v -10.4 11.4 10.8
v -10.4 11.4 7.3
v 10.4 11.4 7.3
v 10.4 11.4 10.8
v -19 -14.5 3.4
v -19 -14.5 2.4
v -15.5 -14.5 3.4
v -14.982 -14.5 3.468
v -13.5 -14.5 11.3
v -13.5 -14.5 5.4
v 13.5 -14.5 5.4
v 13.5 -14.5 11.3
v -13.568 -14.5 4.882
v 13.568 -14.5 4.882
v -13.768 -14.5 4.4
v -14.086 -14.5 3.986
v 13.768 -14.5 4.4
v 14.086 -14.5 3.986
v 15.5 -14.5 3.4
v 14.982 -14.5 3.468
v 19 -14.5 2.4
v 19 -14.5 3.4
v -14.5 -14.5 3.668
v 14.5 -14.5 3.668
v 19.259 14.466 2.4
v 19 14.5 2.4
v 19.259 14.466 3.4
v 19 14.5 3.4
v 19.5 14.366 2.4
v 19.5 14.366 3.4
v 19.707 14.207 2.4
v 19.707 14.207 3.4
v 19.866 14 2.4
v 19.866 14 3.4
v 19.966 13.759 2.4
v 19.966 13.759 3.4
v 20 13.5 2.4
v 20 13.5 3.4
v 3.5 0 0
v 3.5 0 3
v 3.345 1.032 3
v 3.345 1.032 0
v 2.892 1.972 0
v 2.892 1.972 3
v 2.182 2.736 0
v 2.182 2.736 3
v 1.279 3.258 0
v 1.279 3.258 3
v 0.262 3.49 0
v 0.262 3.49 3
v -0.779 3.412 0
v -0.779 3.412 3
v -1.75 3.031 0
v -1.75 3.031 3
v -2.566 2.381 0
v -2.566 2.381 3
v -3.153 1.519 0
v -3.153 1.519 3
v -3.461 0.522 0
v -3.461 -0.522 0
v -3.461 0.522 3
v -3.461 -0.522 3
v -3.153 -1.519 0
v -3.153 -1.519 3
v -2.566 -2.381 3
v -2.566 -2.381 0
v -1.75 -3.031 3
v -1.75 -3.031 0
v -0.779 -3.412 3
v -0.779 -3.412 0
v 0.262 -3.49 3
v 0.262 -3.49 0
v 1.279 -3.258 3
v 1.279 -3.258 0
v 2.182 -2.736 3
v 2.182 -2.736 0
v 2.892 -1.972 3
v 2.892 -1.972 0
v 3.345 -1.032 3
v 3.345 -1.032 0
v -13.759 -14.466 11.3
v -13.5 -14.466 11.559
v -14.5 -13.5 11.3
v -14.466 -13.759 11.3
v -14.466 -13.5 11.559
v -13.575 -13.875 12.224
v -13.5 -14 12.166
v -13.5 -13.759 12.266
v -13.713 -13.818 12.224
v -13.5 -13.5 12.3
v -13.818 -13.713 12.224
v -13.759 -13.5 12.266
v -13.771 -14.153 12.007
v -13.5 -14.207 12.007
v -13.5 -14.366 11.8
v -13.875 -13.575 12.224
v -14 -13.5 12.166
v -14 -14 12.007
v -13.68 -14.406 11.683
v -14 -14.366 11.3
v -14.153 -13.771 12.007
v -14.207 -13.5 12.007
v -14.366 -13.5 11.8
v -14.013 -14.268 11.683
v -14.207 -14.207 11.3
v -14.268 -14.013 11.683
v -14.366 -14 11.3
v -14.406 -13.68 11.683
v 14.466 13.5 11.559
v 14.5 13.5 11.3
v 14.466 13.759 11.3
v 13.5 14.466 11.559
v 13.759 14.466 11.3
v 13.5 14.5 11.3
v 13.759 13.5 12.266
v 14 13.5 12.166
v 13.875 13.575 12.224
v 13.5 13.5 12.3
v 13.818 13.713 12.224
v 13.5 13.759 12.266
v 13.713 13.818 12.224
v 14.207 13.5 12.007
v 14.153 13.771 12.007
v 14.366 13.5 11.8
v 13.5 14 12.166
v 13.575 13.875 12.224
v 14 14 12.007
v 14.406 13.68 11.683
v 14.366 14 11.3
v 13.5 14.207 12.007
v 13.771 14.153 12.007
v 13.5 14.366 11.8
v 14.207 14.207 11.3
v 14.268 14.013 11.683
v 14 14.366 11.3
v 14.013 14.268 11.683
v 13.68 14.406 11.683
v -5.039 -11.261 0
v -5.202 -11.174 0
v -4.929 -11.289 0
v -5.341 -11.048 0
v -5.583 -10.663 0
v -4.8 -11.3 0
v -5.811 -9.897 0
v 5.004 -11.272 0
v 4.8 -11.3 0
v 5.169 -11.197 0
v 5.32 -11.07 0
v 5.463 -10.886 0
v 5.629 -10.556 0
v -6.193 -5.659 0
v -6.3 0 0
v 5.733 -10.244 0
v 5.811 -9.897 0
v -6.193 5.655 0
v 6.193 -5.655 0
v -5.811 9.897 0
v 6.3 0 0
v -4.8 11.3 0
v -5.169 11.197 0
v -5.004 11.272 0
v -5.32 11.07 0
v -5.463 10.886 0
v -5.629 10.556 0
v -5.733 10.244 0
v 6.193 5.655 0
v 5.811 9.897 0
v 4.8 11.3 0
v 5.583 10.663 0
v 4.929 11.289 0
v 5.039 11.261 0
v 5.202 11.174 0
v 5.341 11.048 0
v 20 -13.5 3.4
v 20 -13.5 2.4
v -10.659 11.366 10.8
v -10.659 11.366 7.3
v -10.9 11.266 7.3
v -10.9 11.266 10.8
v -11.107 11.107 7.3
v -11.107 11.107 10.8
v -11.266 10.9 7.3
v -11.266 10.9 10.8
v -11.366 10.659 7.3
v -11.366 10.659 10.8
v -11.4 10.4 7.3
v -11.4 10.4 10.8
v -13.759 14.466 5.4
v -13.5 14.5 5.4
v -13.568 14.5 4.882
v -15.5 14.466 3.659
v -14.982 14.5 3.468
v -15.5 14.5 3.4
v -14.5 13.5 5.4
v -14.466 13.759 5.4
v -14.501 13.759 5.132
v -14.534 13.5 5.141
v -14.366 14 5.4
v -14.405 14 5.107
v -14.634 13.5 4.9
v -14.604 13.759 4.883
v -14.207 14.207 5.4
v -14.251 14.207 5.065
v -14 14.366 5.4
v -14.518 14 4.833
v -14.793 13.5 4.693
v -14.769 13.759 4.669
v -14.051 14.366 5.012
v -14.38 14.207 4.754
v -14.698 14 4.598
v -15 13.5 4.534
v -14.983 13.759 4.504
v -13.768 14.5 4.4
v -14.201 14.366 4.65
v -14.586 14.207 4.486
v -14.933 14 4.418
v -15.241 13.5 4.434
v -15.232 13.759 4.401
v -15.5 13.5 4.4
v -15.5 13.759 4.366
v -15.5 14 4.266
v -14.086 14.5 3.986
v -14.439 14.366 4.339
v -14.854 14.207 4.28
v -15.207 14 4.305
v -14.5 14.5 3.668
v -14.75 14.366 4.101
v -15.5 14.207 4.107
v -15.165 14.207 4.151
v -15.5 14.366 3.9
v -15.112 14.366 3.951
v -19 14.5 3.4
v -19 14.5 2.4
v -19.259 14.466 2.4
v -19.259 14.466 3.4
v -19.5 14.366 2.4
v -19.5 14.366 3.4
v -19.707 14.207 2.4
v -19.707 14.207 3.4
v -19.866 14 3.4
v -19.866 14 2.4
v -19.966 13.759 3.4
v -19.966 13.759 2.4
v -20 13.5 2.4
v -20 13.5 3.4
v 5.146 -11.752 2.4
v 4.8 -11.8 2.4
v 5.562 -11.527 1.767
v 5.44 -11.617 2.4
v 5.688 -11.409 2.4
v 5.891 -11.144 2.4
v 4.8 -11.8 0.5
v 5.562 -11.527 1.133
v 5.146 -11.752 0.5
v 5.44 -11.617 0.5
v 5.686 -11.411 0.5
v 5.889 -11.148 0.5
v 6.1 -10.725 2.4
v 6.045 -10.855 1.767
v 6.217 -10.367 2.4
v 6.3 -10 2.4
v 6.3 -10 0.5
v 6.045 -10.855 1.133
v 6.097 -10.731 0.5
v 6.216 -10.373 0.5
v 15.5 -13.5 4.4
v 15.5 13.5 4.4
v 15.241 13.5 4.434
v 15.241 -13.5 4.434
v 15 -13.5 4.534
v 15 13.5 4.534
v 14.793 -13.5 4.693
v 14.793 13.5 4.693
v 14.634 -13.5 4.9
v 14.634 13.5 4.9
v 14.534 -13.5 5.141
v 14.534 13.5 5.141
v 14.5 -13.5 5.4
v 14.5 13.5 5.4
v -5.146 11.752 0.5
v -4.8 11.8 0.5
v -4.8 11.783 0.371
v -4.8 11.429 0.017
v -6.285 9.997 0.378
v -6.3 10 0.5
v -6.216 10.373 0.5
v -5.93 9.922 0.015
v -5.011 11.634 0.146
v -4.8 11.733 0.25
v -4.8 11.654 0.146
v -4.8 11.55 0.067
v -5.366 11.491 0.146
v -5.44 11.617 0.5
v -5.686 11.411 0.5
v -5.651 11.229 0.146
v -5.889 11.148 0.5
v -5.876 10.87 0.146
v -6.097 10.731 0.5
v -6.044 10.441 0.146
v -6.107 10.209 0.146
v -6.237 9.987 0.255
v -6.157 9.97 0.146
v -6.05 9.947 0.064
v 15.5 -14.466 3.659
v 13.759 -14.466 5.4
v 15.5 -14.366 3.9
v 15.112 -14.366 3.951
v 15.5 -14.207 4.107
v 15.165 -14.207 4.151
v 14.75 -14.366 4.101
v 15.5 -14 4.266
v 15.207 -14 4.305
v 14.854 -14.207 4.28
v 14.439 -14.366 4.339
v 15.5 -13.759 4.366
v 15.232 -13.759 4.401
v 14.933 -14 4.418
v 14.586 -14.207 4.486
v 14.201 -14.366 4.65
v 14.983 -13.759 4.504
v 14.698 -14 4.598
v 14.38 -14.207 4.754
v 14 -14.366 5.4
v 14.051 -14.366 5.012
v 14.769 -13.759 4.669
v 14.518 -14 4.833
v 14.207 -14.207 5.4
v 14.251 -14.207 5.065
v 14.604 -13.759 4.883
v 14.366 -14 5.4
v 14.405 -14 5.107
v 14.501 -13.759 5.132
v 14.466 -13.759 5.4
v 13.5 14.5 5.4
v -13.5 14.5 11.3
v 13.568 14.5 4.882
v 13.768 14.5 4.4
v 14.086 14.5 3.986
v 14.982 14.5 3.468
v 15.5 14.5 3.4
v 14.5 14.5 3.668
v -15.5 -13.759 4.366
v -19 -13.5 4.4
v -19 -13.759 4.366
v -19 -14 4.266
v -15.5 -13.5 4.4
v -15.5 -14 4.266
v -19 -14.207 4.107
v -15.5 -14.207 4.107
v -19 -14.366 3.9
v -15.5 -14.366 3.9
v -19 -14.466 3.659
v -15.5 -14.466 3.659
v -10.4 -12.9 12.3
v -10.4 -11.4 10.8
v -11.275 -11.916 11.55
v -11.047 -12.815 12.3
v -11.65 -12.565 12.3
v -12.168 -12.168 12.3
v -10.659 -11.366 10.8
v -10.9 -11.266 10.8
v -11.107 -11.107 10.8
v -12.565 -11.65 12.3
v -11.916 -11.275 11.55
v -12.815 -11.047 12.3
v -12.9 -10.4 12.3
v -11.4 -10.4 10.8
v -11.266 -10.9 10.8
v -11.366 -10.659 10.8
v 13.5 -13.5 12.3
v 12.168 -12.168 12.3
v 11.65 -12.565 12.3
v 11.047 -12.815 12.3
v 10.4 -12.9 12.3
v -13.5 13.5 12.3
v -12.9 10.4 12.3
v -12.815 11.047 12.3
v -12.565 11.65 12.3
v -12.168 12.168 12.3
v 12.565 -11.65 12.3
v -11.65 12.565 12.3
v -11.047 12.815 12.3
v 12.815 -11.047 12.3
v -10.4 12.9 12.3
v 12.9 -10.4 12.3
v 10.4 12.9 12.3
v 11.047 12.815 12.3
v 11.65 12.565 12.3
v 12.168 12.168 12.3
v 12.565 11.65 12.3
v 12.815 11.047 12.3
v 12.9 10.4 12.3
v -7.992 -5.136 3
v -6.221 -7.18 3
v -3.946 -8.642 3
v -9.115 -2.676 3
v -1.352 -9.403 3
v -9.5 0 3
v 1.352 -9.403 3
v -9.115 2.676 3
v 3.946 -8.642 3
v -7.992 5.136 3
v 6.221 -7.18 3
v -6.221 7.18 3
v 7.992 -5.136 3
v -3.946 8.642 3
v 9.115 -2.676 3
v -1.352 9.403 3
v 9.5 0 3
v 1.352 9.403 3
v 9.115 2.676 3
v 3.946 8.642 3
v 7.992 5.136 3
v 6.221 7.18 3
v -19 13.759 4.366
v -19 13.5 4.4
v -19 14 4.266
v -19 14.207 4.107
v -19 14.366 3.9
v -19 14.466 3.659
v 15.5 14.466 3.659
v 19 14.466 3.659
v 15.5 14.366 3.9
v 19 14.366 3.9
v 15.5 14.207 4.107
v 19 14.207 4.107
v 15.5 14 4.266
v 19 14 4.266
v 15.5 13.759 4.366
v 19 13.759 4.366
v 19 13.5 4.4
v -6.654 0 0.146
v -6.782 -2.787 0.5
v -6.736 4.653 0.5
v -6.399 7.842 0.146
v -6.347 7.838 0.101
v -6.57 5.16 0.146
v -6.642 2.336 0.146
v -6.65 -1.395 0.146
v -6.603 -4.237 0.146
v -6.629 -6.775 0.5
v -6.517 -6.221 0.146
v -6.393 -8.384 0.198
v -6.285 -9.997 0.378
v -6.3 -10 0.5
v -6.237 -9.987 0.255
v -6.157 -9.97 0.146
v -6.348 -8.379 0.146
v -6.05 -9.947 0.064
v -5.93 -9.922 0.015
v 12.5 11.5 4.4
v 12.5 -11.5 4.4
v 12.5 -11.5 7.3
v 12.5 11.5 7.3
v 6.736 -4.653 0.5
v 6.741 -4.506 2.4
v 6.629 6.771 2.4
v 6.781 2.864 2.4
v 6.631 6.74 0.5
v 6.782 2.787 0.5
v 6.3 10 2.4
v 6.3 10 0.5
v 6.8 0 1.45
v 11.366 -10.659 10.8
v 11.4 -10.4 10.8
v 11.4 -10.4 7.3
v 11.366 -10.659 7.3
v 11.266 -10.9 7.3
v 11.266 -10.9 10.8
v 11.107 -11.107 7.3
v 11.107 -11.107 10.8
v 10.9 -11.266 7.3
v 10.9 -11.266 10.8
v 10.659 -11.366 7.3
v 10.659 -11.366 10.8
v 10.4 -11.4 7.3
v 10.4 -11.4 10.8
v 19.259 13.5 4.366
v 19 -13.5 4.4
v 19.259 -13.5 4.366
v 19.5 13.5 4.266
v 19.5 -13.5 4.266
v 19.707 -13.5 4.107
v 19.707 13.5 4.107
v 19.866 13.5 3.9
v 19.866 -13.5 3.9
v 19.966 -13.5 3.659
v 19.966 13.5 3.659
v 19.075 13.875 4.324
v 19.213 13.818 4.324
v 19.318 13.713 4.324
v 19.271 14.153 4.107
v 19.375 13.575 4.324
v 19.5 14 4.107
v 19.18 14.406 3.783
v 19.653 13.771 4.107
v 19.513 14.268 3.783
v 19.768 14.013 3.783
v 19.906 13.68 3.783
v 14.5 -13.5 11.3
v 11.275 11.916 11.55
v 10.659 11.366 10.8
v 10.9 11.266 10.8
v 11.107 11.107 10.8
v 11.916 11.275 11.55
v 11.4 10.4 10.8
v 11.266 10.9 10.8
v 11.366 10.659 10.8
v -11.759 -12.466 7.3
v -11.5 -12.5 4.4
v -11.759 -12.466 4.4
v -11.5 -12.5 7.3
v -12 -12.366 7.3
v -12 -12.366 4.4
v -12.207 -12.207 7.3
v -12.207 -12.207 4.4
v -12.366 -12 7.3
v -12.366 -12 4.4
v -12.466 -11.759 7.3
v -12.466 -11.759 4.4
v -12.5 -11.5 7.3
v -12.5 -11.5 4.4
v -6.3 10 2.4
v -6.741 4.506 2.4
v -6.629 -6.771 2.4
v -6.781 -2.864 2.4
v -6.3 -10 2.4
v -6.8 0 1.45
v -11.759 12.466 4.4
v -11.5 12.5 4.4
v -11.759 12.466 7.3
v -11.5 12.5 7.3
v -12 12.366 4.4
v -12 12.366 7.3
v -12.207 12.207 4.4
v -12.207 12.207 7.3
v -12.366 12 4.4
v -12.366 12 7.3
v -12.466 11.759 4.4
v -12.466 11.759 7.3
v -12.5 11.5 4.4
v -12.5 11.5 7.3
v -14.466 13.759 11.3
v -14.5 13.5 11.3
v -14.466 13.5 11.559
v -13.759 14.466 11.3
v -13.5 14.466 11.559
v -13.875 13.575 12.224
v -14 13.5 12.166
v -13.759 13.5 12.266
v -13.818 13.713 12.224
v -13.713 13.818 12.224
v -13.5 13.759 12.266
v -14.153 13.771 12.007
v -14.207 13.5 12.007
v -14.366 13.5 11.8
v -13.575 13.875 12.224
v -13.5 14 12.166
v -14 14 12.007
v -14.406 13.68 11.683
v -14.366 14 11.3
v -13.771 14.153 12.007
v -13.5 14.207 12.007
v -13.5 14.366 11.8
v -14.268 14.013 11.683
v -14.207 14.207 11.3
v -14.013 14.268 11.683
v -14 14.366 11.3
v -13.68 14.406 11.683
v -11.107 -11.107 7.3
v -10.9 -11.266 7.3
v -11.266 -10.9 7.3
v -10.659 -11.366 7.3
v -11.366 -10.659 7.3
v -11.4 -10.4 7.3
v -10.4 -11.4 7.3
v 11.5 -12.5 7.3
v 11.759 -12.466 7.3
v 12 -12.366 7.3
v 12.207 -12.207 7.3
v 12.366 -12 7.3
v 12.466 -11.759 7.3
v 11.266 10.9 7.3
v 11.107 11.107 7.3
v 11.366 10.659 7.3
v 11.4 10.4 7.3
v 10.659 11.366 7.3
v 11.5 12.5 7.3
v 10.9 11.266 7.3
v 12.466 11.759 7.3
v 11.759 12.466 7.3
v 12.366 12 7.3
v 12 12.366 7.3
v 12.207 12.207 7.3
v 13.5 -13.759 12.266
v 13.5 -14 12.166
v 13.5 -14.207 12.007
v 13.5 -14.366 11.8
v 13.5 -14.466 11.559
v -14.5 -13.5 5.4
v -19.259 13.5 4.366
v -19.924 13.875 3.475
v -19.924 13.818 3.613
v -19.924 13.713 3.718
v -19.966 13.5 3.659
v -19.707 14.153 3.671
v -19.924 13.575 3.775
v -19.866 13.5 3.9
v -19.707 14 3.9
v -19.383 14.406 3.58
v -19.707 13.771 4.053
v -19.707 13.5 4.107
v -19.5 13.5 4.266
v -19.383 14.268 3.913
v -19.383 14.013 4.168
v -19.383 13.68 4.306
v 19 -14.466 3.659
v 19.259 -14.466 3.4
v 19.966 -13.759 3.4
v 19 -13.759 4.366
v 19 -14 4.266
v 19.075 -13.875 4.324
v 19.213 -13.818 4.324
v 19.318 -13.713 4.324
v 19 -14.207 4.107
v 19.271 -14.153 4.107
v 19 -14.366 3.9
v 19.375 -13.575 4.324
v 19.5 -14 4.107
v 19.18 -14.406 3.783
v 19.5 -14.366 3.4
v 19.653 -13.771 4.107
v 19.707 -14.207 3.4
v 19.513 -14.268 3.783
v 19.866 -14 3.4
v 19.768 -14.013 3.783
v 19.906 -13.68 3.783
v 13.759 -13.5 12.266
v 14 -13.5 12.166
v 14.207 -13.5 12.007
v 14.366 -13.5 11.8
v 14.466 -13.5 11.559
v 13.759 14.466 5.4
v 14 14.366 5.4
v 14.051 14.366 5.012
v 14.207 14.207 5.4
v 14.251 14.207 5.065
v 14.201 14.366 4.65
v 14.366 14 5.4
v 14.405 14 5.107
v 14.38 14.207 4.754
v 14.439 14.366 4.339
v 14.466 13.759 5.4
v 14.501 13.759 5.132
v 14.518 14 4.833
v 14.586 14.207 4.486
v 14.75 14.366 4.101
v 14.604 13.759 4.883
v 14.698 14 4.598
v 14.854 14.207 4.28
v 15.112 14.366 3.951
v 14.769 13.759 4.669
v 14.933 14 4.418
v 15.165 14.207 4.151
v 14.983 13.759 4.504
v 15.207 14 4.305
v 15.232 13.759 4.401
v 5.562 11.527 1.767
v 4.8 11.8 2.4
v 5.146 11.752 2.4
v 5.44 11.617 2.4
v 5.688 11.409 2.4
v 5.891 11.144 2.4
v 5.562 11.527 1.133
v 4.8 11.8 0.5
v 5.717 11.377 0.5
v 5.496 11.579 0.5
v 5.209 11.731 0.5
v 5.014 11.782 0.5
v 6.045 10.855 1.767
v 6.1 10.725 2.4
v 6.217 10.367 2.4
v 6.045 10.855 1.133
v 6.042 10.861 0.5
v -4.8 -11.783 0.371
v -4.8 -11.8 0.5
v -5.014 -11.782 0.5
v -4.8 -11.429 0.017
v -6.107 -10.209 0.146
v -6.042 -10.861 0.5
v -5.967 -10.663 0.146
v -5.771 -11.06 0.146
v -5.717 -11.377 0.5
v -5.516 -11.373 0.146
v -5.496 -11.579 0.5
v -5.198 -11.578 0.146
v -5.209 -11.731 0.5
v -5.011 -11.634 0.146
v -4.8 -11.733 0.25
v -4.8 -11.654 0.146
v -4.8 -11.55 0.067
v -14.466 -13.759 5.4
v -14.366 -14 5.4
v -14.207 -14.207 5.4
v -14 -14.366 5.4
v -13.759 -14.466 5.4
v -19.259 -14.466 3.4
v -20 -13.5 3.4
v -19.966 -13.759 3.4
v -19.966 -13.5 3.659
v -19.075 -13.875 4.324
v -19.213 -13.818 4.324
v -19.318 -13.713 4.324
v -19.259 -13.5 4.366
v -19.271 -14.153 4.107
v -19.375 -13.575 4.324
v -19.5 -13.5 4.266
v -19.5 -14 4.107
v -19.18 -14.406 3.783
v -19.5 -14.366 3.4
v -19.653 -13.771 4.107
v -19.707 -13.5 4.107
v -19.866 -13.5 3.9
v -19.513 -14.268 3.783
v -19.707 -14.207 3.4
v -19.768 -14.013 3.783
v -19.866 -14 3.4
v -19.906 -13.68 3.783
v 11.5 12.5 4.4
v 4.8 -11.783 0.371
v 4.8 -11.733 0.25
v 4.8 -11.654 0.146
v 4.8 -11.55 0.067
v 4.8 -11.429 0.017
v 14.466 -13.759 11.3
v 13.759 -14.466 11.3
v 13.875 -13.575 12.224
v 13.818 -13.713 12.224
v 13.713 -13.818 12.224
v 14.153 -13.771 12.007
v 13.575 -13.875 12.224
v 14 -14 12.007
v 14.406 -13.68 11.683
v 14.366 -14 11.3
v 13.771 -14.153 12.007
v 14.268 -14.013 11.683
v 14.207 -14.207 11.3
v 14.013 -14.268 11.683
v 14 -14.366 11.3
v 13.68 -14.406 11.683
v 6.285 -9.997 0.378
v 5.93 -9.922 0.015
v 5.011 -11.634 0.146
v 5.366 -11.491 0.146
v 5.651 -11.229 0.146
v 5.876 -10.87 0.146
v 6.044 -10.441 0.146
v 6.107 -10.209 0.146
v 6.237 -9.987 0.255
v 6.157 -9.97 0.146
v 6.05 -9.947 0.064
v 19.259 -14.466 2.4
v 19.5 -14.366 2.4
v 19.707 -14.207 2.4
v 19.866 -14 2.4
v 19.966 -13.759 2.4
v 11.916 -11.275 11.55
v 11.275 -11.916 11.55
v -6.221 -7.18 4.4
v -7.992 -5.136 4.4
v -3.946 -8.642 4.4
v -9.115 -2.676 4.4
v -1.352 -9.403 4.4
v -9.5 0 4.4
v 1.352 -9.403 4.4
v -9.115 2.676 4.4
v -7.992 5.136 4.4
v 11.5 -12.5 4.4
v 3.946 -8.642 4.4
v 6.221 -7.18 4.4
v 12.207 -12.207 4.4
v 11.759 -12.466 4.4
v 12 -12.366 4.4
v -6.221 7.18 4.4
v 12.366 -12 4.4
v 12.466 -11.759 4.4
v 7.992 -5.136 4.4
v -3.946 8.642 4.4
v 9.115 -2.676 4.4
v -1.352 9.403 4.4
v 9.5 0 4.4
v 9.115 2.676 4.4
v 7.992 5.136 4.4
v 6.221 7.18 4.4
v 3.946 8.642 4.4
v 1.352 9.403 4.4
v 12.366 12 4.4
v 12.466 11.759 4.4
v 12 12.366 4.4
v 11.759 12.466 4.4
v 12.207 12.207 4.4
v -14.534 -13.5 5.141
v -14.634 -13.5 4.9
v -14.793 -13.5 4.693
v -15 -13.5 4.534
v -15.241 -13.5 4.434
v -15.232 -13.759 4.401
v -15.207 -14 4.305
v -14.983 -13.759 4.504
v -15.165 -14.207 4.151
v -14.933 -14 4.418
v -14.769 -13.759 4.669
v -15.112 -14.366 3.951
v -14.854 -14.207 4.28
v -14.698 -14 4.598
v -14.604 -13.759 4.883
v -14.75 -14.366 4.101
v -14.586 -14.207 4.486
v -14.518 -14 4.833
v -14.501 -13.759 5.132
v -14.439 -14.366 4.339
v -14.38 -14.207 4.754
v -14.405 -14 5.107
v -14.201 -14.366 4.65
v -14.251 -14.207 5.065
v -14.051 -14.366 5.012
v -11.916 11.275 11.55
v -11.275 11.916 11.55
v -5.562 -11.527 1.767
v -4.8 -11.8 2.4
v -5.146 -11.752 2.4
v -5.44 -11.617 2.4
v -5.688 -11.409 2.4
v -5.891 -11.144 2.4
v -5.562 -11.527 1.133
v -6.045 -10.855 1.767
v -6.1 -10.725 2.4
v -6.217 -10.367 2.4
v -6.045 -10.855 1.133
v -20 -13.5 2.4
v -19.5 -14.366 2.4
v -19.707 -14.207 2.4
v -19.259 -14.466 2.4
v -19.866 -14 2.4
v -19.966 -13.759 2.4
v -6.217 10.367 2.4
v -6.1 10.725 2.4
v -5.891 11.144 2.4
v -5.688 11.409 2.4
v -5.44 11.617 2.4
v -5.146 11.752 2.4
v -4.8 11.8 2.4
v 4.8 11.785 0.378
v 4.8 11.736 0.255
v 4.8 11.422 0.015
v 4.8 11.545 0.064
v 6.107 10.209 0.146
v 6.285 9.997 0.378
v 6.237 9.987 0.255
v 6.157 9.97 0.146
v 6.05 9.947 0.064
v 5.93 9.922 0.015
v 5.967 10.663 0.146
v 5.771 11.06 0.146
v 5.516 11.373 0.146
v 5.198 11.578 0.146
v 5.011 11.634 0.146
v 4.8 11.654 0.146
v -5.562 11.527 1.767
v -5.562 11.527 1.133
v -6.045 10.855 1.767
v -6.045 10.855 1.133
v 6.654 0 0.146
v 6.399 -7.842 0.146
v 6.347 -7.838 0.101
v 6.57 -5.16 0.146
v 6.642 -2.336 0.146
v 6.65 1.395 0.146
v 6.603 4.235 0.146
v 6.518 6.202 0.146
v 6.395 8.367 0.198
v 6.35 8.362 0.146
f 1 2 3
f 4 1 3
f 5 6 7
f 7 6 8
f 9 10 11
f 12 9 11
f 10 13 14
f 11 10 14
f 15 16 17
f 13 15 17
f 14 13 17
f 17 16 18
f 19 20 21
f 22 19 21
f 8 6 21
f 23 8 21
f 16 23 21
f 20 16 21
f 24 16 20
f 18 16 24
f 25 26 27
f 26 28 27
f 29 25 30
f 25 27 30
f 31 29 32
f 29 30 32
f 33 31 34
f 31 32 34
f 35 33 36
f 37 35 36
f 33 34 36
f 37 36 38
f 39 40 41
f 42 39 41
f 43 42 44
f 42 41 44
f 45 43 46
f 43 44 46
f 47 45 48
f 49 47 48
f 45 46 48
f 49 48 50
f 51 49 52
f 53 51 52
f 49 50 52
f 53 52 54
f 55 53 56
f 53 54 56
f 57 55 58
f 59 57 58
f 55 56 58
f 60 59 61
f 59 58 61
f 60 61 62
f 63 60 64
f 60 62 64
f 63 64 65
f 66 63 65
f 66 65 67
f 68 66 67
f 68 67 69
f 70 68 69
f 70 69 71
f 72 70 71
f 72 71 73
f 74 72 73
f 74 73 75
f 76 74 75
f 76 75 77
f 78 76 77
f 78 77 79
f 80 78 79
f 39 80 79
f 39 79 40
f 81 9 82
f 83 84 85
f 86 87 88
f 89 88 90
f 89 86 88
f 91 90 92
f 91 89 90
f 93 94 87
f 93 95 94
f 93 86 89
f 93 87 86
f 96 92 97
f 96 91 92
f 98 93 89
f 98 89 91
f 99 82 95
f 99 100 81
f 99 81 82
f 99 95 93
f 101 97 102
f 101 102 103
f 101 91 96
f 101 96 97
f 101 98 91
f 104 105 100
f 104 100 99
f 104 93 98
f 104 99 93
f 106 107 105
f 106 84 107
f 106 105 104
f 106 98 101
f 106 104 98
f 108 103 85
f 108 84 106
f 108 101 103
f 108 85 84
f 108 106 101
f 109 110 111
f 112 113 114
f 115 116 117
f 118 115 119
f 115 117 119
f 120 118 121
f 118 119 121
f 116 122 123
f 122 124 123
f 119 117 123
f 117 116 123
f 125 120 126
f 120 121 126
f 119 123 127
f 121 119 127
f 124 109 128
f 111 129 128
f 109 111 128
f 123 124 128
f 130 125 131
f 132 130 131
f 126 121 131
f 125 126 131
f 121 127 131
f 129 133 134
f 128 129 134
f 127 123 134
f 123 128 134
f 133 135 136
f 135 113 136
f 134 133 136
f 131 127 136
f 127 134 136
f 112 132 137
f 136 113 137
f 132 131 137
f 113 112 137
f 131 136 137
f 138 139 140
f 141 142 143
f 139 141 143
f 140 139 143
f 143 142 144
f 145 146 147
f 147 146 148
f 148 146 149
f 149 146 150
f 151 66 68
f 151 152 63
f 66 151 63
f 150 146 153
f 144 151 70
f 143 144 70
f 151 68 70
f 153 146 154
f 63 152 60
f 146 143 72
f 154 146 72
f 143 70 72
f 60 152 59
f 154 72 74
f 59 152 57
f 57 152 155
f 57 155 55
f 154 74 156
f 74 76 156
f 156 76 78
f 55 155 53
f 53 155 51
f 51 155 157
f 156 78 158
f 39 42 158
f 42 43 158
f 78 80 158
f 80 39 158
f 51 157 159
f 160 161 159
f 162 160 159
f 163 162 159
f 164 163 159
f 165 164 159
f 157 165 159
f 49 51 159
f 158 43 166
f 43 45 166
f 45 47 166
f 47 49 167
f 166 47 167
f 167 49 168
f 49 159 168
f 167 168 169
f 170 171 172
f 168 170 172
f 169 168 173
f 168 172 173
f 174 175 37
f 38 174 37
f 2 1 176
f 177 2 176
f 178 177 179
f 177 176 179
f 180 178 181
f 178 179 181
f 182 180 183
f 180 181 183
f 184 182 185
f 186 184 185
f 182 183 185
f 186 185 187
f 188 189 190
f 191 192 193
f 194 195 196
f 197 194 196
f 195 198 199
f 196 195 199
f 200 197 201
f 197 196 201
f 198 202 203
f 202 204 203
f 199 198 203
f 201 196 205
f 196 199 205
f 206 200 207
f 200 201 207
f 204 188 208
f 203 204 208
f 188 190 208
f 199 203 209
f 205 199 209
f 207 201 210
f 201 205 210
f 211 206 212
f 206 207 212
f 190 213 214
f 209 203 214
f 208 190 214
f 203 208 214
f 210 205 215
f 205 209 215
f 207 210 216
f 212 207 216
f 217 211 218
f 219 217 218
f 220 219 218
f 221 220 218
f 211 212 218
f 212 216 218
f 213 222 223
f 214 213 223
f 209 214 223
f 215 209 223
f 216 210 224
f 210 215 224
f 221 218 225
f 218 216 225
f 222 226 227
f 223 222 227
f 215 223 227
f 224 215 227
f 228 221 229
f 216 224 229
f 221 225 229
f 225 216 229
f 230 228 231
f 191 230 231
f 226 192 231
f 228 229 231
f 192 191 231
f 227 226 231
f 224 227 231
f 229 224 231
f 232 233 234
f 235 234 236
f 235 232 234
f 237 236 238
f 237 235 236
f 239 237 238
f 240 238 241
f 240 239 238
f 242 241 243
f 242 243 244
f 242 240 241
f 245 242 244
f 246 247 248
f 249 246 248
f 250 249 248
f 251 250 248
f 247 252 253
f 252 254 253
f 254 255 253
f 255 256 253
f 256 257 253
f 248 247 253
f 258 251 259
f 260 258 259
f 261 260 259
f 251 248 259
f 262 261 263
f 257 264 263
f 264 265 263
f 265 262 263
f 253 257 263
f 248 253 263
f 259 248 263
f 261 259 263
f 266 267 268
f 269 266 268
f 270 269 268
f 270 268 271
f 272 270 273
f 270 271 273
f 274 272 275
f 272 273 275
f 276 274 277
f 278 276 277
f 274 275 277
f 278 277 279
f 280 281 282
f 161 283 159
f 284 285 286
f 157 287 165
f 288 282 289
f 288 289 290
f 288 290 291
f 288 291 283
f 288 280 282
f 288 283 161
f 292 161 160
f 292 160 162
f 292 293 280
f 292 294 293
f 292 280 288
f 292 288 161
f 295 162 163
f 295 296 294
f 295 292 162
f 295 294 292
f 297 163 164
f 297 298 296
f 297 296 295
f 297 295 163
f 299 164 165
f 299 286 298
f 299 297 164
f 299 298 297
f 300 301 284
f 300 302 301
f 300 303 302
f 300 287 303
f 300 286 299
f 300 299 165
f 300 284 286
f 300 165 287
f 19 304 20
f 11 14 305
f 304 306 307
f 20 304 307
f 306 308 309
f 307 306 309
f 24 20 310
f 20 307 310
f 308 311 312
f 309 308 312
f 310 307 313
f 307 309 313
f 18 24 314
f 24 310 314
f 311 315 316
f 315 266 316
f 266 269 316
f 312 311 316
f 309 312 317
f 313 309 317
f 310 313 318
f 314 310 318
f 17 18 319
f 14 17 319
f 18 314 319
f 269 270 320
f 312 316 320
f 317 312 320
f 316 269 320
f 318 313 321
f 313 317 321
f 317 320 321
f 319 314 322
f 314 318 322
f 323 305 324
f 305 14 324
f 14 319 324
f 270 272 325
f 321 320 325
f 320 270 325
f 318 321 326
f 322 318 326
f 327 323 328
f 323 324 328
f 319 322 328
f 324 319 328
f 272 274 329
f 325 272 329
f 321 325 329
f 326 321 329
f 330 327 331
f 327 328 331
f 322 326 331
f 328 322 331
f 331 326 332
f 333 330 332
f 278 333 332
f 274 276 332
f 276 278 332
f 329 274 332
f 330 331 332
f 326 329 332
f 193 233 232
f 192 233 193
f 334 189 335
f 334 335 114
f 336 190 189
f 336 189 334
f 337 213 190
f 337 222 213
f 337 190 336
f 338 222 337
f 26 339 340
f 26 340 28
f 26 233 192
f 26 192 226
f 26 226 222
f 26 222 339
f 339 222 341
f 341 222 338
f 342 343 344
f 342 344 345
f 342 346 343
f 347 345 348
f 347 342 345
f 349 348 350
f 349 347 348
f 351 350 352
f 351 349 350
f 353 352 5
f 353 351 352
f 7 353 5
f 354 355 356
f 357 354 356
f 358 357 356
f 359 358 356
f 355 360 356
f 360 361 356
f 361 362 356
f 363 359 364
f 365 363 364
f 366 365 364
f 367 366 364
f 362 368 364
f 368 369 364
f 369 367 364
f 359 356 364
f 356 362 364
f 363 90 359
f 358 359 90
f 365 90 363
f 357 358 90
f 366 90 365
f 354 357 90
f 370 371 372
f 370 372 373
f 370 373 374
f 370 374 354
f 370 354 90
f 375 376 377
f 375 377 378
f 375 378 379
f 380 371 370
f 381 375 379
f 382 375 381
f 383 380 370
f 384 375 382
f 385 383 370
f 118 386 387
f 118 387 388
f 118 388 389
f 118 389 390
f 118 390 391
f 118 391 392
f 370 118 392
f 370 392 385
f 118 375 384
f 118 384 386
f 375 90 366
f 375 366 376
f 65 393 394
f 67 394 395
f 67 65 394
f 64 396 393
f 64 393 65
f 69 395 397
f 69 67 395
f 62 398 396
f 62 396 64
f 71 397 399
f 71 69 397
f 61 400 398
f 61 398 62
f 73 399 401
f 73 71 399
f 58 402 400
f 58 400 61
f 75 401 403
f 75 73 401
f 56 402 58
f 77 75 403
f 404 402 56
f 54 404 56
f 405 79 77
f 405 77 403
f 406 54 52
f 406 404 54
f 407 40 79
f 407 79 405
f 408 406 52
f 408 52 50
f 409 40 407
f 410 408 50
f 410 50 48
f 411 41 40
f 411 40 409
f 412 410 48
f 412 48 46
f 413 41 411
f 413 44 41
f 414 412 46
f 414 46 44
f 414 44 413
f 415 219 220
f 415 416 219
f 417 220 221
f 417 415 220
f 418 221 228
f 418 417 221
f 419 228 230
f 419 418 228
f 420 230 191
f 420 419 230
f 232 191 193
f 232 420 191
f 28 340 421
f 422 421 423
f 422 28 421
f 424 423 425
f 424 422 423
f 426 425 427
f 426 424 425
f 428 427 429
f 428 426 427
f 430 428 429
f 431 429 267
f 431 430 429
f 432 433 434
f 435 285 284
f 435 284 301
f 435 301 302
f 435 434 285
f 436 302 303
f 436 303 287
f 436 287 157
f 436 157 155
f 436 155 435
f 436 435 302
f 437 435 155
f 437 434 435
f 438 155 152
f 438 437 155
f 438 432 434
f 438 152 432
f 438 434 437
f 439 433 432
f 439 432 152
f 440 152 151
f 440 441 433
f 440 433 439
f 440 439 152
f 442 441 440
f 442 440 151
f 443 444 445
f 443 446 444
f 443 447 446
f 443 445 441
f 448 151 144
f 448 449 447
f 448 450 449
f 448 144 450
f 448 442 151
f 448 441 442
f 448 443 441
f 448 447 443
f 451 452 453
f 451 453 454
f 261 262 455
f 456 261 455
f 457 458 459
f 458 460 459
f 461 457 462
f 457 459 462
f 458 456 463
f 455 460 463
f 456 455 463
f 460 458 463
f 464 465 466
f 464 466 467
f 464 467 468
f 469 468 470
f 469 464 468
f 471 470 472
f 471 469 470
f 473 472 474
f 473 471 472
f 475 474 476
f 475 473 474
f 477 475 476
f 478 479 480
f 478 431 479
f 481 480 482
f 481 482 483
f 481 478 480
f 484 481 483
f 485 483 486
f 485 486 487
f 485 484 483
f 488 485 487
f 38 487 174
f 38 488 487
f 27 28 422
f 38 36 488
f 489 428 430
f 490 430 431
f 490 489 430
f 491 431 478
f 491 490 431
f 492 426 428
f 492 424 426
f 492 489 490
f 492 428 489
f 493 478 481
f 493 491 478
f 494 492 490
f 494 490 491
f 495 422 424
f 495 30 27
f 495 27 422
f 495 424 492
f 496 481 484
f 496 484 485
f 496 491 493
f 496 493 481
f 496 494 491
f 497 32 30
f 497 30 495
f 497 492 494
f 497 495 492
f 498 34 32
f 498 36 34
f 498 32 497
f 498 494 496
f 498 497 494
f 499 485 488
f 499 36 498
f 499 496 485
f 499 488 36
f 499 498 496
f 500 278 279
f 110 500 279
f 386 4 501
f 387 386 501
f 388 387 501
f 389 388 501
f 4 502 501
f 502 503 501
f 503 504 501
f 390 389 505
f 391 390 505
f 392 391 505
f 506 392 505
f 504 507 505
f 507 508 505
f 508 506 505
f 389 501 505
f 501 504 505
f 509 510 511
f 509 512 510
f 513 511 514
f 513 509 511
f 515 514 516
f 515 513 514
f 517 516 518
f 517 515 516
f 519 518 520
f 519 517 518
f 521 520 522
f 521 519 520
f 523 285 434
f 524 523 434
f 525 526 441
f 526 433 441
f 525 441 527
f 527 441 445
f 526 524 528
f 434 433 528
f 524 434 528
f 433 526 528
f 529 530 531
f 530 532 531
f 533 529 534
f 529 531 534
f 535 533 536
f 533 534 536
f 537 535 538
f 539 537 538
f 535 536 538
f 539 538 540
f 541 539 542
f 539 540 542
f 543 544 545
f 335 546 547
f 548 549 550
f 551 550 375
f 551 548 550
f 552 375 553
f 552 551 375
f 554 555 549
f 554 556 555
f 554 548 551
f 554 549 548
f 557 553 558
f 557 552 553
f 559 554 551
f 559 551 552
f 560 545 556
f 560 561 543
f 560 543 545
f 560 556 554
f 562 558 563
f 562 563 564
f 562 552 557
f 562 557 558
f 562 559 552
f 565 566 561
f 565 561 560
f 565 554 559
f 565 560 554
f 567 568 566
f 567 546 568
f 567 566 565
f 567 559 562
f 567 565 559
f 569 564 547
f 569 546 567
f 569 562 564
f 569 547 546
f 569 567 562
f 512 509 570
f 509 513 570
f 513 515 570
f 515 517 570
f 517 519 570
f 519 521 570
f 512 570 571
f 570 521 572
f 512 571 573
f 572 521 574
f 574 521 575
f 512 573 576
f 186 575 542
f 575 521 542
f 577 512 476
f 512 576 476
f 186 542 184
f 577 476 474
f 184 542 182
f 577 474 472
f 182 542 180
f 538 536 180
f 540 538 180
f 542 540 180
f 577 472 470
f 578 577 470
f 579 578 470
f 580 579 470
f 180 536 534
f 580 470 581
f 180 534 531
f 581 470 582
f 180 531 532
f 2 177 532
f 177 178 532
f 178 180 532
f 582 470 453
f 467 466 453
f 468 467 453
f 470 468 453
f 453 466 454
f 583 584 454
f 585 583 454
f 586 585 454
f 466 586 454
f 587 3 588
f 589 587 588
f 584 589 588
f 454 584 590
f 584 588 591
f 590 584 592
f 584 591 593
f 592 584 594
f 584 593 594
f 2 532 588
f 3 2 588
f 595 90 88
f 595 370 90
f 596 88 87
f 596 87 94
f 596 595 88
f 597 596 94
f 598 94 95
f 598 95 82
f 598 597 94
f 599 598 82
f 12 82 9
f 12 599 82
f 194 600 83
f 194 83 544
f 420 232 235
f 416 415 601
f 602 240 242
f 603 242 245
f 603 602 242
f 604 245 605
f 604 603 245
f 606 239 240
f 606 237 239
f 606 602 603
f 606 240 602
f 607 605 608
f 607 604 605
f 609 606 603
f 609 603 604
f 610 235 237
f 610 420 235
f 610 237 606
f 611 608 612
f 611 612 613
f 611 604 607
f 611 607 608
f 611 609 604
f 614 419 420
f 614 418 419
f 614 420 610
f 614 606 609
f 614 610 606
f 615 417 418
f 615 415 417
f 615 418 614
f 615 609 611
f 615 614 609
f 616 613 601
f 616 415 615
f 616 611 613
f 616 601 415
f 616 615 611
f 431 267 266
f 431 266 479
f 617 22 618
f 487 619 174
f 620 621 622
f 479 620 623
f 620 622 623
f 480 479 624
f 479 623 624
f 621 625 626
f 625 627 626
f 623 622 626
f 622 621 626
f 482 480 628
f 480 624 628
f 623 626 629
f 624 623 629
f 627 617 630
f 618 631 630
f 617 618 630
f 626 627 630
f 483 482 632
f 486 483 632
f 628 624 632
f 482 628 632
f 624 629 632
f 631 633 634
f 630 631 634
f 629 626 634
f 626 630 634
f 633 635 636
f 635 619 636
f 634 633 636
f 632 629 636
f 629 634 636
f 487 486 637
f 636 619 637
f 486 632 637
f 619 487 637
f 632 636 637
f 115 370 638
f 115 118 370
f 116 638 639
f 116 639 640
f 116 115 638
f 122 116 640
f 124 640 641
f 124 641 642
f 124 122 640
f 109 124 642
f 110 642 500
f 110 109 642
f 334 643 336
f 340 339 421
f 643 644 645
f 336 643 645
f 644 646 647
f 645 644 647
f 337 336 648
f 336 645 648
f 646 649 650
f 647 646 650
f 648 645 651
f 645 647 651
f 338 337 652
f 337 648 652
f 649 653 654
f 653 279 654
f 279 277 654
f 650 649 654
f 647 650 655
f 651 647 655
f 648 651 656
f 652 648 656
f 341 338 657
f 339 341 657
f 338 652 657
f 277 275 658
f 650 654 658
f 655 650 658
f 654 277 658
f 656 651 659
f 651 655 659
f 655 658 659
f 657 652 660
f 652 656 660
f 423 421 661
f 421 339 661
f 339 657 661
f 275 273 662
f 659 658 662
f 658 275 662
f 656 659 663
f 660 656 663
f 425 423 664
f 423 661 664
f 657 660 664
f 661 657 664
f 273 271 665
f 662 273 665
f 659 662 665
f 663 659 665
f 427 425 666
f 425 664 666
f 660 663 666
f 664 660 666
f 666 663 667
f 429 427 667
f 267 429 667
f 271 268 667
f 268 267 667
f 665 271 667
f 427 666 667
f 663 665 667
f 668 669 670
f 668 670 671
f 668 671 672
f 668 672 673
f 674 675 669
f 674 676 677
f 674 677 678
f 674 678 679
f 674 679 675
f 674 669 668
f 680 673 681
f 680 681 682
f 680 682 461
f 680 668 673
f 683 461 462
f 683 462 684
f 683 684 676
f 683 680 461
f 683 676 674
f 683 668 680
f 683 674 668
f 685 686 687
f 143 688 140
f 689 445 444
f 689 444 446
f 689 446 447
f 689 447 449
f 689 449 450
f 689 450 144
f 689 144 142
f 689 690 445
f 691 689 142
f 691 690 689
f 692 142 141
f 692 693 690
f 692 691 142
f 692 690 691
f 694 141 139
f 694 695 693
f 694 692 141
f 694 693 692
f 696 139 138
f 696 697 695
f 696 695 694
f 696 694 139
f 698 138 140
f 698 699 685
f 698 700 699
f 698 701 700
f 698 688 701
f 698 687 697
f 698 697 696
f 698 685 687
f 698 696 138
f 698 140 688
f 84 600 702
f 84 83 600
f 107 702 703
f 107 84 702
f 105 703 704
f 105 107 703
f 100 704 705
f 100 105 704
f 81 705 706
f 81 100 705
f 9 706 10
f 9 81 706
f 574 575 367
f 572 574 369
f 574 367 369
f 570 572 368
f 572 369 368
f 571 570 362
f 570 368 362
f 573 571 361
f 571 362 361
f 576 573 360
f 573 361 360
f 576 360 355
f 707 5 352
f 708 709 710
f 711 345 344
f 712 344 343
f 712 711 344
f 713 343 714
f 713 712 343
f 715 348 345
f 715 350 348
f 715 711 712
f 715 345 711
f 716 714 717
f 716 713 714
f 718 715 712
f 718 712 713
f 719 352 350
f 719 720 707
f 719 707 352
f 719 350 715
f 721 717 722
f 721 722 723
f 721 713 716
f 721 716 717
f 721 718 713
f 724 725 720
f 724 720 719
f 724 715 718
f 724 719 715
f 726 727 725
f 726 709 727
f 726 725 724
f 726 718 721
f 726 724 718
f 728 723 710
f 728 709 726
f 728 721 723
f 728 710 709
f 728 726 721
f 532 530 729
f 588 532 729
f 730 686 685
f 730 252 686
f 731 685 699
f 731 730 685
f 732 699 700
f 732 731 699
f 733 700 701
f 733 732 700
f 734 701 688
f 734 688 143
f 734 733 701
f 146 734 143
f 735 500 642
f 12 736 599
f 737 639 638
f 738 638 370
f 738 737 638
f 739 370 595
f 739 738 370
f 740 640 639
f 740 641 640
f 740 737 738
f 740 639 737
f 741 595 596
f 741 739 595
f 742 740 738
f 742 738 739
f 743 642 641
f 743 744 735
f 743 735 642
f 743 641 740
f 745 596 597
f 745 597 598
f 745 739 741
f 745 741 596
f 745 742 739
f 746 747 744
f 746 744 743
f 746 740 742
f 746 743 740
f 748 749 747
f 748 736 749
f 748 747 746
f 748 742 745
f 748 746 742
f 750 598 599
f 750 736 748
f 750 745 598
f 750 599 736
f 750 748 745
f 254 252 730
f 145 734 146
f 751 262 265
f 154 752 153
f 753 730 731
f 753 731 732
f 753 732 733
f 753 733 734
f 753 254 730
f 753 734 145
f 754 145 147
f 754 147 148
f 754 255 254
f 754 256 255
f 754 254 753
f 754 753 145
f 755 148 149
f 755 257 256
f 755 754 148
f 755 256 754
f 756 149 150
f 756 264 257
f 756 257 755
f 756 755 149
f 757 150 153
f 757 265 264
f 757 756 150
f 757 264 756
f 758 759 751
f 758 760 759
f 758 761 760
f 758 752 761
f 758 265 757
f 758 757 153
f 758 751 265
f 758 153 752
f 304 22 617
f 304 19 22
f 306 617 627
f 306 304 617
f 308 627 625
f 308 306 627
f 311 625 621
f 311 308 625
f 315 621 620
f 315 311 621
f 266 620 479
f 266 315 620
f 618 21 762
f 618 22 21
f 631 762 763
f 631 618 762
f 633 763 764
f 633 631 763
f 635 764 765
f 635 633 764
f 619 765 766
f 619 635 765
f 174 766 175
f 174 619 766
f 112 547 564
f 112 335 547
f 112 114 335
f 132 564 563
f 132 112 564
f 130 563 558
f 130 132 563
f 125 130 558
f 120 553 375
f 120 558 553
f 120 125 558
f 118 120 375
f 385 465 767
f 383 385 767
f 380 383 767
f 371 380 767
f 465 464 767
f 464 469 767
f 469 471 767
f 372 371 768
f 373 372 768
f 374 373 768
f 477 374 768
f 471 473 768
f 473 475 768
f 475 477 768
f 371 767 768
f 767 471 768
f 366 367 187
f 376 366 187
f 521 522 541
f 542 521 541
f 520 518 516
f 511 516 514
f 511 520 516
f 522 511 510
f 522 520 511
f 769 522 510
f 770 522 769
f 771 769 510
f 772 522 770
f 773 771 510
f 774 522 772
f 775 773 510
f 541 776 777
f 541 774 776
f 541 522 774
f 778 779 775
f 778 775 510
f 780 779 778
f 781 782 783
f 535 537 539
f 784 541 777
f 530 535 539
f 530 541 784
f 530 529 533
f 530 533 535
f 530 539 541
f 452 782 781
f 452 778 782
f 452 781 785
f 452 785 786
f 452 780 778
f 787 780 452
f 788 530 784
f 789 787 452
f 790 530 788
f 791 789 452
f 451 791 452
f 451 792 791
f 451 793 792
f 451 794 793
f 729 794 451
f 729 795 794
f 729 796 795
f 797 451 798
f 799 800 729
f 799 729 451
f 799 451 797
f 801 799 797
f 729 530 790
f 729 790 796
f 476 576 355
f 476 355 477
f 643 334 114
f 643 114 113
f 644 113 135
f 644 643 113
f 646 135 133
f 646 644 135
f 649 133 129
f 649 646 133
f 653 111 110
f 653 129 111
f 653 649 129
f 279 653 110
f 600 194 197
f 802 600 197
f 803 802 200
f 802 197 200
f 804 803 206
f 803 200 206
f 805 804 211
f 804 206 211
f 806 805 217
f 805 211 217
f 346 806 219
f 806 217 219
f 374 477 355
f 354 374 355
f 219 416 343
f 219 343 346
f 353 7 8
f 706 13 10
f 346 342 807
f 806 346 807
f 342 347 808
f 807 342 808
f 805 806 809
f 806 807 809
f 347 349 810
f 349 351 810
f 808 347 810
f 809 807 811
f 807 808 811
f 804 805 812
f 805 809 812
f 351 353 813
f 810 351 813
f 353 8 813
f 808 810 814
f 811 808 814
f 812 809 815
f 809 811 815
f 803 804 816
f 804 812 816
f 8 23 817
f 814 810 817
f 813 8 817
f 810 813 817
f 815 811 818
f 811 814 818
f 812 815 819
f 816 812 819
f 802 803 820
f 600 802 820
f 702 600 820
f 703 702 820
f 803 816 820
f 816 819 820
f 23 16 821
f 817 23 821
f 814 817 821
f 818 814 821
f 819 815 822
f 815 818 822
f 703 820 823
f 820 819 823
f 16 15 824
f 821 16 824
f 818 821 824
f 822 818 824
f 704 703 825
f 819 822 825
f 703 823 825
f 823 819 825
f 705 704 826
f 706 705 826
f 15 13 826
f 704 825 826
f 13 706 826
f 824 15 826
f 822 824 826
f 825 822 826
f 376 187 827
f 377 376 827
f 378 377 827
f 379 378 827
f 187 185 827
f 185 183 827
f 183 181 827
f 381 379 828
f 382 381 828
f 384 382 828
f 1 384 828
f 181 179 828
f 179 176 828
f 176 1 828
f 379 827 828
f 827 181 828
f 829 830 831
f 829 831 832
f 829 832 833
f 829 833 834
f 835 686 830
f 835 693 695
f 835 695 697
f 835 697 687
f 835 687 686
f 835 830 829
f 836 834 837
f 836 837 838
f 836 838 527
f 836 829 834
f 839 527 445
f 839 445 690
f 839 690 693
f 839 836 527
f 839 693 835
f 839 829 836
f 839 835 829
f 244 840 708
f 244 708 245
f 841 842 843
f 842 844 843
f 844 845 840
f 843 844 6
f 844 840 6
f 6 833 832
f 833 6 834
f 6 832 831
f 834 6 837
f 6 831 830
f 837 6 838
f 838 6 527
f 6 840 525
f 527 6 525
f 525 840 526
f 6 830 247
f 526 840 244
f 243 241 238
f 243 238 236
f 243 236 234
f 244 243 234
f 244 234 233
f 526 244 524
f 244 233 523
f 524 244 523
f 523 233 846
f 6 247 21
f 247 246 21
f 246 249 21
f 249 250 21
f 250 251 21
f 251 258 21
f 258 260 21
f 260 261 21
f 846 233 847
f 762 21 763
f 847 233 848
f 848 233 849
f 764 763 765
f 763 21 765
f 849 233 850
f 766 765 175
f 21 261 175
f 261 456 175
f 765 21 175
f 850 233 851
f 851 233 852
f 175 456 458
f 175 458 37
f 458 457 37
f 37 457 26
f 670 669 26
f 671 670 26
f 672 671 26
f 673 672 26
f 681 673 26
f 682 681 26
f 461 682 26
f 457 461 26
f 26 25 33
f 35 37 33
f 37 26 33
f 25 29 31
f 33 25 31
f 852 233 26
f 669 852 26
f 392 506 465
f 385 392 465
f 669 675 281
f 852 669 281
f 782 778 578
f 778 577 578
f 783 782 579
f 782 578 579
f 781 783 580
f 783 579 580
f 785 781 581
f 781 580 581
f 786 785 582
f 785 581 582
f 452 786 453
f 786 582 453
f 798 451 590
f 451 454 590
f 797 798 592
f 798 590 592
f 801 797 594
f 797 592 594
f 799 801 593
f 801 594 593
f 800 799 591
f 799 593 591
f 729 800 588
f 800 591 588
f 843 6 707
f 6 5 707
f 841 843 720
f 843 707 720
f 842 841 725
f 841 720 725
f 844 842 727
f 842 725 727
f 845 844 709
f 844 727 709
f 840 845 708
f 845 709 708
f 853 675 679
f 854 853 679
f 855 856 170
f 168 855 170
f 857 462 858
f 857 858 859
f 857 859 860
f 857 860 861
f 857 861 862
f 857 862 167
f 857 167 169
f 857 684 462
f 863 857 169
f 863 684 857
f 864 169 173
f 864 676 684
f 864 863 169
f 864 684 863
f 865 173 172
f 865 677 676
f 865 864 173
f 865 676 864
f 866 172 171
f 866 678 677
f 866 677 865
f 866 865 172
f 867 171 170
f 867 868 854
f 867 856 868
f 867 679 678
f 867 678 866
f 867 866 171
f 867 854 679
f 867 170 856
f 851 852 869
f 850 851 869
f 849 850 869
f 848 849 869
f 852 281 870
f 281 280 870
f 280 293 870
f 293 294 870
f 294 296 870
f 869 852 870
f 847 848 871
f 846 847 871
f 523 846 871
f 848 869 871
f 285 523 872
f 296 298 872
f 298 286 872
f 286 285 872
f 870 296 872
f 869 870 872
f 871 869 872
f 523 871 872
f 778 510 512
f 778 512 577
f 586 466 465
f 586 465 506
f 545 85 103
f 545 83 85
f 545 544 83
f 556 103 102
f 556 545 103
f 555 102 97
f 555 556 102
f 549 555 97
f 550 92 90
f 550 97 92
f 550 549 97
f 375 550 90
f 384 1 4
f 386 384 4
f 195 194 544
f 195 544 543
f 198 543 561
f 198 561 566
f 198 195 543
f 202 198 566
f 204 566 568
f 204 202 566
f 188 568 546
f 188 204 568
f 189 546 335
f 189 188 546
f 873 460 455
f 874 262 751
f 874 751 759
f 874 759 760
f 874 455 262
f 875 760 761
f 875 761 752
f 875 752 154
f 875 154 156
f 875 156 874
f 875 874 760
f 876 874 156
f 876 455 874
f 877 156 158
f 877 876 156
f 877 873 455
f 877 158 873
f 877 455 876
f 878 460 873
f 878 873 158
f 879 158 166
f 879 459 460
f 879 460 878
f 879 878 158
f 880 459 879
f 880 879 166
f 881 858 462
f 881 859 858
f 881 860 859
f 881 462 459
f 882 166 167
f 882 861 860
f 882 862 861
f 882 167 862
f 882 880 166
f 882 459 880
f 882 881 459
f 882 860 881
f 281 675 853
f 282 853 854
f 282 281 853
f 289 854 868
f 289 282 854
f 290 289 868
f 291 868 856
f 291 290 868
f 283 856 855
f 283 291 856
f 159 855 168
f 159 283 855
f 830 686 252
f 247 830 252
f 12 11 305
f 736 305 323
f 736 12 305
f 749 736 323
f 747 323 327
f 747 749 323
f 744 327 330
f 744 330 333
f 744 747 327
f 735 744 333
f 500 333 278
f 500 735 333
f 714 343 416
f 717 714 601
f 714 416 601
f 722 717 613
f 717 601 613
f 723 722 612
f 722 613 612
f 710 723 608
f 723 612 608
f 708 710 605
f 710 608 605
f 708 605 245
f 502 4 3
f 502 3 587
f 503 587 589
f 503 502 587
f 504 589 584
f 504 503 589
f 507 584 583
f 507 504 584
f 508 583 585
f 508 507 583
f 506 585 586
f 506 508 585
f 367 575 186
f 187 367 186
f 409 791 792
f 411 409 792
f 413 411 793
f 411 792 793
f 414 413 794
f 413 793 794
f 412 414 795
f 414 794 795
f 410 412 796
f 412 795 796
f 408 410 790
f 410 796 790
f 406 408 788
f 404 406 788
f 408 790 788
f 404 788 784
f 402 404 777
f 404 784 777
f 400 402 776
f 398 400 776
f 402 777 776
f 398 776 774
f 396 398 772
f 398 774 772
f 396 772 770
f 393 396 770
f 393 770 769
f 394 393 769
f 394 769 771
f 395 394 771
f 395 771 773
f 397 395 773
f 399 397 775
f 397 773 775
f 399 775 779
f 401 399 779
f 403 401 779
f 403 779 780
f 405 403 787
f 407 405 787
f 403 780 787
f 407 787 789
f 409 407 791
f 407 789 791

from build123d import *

# Parameters (mm, degrees)
F1_DEPTH  = 2.4
F2_W      = 40
F2_H      = 29
F3_DEPTH  = 2
F4_R      = 9.5
F4_R_2    = 3.5
F5_DEPTH  = 1.4
F6_DEPTH  = 4.4010001
F7_W      = 29
F7_H      = 29
F7_W_2    = 25
F7_H_2    = 25
F8_DEPTH  = 2.9
F9_W      = 29
F9_H      = 29
F9_W_2    = 22.8
F9_H_2    = 22.8
F10_DEPTH = 5
F11_F1_R  = 1
F11_F2_R  = 1
F12_SIZE  = 1.5
F13_R     = 0.5


with BuildPart() as f1:
    # F0 (on Top) → F1 (new body)
    with BuildSketch(Plane.XY):
        with BuildLine():
            Line((0, 11.8), (-4.8, 11.8))
            add(Edge.make_bspline(
                [(-4.8, 11.8), (-5.7190243266, 11.8), (-6.1421032596, 10.873414806), (-6.3, 10)],
                knots=[0, 0, 0, 0, 2.3430749028, 2.3430749028, 2.3430749028, 2.3430749028], degree=3))
            add(Edge.make_bspline(
                [(-6.3, 10), (-6.75, 6.8473730727), (-6.8, 3.4224423006), (-6.8, 0)],
                knots=[0, 0, 0, 0, 10.0124921973, 10.0124921973, 10.0124921973, 10.0124921973], degree=3))
            add(Edge.make_bspline(
                [(-6.3, -10), (-6.75, -6.8473730727), (-6.8, -3.4224423006), (-6.8, 0)],
                knots=[0, 0, 0, 0, 10.0124921973, 10.0124921973, 10.0124921973, 10.0124921973], degree=3))
            add(Edge.make_bspline(
                [(-4.8, -11.8), (-5.7190243266, -11.8), (-6.1421032596, -10.873414806), (-6.3, -10)],
                knots=[0, 0, 0, 0, 2.3430749028, 2.3430749028, 2.3430749028, 2.3430749028], degree=3))
            Line((-4.8, -11.8), (0, -11.8))
            Line((0, -11.8), (4.8, -11.8))
            add(Edge.make_bspline(
                [(4.8, -11.8), (5.7190243266, -11.8), (6.1421032596, -10.873414806), (6.3, -10)],
                knots=[0, 0, 0, 0, 2.3430749028, 2.3430749028, 2.3430749028, 2.3430749028], degree=3))
            add(Edge.make_bspline(
                [(6.3, -10), (6.75, -6.8473730727), (6.8, -3.4224423006), (6.8, 0)],
                knots=[0, 0, 0, 0, 10.0124921973, 10.0124921973, 10.0124921973, 10.0124921973], degree=3))
            add(Edge.make_bspline(
                [(6.3, 10), (6.75, 6.8473730727), (6.8, 3.4224423006), (6.8, 0)],
                knots=[0, 0, 0, 0, 10.0124921973, 10.0124921973, 10.0124921973, 10.0124921973], degree=3))
            add(Edge.make_bspline(
                [(4.8, 11.8), (5.7190243266, 11.8), (6.1421032596, 10.873414806), (6.3, 10)],
                knots=[0, 0, 0, 0, 2.3430749028, 2.3430749028, 2.3430749028, 2.3430749028], degree=3))
            Line((4.8, 11.8), (0, 11.8))
        make_face()
    extrude(amount=F1_DEPTH)

    # F2 (on face) → F3 (join)
    with BuildSketch(Plane.XY.offset(2.4)):
        Rectangle(F2_W, F2_H)
    extrude(amount=F3_DEPTH)

    # F4 (on face) → F5 (cut)
    with BuildSketch(Plane.XY.offset(4.4)):
        Circle(F4_R)
        Circle(F4_R_2, mode=Mode.SUBTRACT)
    extrude(amount=-F5_DEPTH, mode=Mode.SUBTRACT)

    # F6 (cut, through all): a face of the model
    f6_faces = [f1.faces().sort_by_distance(p)[0] for p in [
        (0, 0, 4.4),
    ]]
    extrude(f6_faces, amount=-F6_DEPTH, mode=Mode.SUBTRACT)

    # F7 (on face) → F8 (join)
    with BuildSketch(Plane.XY.offset(4.4)):
        Rectangle(F7_W, F7_H)
        Rectangle(F7_W_2, F7_H_2, mode=Mode.SUBTRACT)
    extrude(amount=F8_DEPTH)

    # F9 (on face) → F10 (join)
    with BuildSketch(Plane.XY.offset(7.3)):
        Rectangle(F9_W, F9_H)
        Rectangle(F9_W_2, F9_H_2, mode=Mode.SUBTRACT)
    extrude(amount=F10_DEPTH)

    # F11: fillet of radius 1 on 24 edges, made by hand

    # F11_f1
    f11_f1_edges = [f1.edges().sort_by_distance(p)[0] for p in [
        (12.5, -12.5, 5.85),
        (11.4, 11.4, 9.8),
        (12.5, 12.5, 5.85),
        (-12.5, -12.5, 5.85),
        (-11.4, -11.4, 9.8),
        (-12.5, 12.5, 5.85),
        (14.5, 0, 4.4),
        (-14.5, 0, 4.4),
        (11.4, -11.4, 9.8),
        (-11.4, 11.4, 9.8),
    ]]
    fillet(f11_f1_edges, radius=F11_F1_R)

    # F11_f2
    f11_f2_edges = [f1.edges().sort_by_distance(p)[0] for p in [
        (-20, -14.5, 3.4),
        (20, -14.5, 3.4),
        (14.5, -14.5, 8.85),
        (-14.5, -14.5, 8.85),
        (-14.5, 14.5, 8.85),
        (-20, 14.5, 3.4),
        (20, 14.5, 3.4),
        (14.5, 14.5, 8.85),
        (-20, 0, 4.4),
        (20, 0, 4.4),
        (14.5, 0, 12.3),
        (0, -14.5, 12.3),
        (-14.5, 0, 12.3),
        (0, 14.5, 12.3),
        (14.7928932188, 14.5, 4.6928932188),
        (-14.7928932188, 14.5, 4.6928932188),
        (-14.7928932188, -14.5, 4.6928932188),
        (14.7928932188, -14.5, 4.6928932188),
    ]]
    fillet(f11_f2_edges, radius=F11_F2_R)

    # F12
    f12_edges = [f1.edges().sort_by_distance(p)[0] for p in [
        (0, 11.4, 12.3),
    ]]
    chamfer(f12_edges, length=F12_SIZE)

    # F13
    f13_edges = [f1.edges().sort_by_distance(p)[0] for p in [
        (-6.722447, -5.009541, 0),
        (0, -11.8, 0),
        (0, 11.8, 0),
        (6.722447, 5.009541, 0),
    ]]
    fillet(f13_edges, radius=F13_R)


solid = f1.part
